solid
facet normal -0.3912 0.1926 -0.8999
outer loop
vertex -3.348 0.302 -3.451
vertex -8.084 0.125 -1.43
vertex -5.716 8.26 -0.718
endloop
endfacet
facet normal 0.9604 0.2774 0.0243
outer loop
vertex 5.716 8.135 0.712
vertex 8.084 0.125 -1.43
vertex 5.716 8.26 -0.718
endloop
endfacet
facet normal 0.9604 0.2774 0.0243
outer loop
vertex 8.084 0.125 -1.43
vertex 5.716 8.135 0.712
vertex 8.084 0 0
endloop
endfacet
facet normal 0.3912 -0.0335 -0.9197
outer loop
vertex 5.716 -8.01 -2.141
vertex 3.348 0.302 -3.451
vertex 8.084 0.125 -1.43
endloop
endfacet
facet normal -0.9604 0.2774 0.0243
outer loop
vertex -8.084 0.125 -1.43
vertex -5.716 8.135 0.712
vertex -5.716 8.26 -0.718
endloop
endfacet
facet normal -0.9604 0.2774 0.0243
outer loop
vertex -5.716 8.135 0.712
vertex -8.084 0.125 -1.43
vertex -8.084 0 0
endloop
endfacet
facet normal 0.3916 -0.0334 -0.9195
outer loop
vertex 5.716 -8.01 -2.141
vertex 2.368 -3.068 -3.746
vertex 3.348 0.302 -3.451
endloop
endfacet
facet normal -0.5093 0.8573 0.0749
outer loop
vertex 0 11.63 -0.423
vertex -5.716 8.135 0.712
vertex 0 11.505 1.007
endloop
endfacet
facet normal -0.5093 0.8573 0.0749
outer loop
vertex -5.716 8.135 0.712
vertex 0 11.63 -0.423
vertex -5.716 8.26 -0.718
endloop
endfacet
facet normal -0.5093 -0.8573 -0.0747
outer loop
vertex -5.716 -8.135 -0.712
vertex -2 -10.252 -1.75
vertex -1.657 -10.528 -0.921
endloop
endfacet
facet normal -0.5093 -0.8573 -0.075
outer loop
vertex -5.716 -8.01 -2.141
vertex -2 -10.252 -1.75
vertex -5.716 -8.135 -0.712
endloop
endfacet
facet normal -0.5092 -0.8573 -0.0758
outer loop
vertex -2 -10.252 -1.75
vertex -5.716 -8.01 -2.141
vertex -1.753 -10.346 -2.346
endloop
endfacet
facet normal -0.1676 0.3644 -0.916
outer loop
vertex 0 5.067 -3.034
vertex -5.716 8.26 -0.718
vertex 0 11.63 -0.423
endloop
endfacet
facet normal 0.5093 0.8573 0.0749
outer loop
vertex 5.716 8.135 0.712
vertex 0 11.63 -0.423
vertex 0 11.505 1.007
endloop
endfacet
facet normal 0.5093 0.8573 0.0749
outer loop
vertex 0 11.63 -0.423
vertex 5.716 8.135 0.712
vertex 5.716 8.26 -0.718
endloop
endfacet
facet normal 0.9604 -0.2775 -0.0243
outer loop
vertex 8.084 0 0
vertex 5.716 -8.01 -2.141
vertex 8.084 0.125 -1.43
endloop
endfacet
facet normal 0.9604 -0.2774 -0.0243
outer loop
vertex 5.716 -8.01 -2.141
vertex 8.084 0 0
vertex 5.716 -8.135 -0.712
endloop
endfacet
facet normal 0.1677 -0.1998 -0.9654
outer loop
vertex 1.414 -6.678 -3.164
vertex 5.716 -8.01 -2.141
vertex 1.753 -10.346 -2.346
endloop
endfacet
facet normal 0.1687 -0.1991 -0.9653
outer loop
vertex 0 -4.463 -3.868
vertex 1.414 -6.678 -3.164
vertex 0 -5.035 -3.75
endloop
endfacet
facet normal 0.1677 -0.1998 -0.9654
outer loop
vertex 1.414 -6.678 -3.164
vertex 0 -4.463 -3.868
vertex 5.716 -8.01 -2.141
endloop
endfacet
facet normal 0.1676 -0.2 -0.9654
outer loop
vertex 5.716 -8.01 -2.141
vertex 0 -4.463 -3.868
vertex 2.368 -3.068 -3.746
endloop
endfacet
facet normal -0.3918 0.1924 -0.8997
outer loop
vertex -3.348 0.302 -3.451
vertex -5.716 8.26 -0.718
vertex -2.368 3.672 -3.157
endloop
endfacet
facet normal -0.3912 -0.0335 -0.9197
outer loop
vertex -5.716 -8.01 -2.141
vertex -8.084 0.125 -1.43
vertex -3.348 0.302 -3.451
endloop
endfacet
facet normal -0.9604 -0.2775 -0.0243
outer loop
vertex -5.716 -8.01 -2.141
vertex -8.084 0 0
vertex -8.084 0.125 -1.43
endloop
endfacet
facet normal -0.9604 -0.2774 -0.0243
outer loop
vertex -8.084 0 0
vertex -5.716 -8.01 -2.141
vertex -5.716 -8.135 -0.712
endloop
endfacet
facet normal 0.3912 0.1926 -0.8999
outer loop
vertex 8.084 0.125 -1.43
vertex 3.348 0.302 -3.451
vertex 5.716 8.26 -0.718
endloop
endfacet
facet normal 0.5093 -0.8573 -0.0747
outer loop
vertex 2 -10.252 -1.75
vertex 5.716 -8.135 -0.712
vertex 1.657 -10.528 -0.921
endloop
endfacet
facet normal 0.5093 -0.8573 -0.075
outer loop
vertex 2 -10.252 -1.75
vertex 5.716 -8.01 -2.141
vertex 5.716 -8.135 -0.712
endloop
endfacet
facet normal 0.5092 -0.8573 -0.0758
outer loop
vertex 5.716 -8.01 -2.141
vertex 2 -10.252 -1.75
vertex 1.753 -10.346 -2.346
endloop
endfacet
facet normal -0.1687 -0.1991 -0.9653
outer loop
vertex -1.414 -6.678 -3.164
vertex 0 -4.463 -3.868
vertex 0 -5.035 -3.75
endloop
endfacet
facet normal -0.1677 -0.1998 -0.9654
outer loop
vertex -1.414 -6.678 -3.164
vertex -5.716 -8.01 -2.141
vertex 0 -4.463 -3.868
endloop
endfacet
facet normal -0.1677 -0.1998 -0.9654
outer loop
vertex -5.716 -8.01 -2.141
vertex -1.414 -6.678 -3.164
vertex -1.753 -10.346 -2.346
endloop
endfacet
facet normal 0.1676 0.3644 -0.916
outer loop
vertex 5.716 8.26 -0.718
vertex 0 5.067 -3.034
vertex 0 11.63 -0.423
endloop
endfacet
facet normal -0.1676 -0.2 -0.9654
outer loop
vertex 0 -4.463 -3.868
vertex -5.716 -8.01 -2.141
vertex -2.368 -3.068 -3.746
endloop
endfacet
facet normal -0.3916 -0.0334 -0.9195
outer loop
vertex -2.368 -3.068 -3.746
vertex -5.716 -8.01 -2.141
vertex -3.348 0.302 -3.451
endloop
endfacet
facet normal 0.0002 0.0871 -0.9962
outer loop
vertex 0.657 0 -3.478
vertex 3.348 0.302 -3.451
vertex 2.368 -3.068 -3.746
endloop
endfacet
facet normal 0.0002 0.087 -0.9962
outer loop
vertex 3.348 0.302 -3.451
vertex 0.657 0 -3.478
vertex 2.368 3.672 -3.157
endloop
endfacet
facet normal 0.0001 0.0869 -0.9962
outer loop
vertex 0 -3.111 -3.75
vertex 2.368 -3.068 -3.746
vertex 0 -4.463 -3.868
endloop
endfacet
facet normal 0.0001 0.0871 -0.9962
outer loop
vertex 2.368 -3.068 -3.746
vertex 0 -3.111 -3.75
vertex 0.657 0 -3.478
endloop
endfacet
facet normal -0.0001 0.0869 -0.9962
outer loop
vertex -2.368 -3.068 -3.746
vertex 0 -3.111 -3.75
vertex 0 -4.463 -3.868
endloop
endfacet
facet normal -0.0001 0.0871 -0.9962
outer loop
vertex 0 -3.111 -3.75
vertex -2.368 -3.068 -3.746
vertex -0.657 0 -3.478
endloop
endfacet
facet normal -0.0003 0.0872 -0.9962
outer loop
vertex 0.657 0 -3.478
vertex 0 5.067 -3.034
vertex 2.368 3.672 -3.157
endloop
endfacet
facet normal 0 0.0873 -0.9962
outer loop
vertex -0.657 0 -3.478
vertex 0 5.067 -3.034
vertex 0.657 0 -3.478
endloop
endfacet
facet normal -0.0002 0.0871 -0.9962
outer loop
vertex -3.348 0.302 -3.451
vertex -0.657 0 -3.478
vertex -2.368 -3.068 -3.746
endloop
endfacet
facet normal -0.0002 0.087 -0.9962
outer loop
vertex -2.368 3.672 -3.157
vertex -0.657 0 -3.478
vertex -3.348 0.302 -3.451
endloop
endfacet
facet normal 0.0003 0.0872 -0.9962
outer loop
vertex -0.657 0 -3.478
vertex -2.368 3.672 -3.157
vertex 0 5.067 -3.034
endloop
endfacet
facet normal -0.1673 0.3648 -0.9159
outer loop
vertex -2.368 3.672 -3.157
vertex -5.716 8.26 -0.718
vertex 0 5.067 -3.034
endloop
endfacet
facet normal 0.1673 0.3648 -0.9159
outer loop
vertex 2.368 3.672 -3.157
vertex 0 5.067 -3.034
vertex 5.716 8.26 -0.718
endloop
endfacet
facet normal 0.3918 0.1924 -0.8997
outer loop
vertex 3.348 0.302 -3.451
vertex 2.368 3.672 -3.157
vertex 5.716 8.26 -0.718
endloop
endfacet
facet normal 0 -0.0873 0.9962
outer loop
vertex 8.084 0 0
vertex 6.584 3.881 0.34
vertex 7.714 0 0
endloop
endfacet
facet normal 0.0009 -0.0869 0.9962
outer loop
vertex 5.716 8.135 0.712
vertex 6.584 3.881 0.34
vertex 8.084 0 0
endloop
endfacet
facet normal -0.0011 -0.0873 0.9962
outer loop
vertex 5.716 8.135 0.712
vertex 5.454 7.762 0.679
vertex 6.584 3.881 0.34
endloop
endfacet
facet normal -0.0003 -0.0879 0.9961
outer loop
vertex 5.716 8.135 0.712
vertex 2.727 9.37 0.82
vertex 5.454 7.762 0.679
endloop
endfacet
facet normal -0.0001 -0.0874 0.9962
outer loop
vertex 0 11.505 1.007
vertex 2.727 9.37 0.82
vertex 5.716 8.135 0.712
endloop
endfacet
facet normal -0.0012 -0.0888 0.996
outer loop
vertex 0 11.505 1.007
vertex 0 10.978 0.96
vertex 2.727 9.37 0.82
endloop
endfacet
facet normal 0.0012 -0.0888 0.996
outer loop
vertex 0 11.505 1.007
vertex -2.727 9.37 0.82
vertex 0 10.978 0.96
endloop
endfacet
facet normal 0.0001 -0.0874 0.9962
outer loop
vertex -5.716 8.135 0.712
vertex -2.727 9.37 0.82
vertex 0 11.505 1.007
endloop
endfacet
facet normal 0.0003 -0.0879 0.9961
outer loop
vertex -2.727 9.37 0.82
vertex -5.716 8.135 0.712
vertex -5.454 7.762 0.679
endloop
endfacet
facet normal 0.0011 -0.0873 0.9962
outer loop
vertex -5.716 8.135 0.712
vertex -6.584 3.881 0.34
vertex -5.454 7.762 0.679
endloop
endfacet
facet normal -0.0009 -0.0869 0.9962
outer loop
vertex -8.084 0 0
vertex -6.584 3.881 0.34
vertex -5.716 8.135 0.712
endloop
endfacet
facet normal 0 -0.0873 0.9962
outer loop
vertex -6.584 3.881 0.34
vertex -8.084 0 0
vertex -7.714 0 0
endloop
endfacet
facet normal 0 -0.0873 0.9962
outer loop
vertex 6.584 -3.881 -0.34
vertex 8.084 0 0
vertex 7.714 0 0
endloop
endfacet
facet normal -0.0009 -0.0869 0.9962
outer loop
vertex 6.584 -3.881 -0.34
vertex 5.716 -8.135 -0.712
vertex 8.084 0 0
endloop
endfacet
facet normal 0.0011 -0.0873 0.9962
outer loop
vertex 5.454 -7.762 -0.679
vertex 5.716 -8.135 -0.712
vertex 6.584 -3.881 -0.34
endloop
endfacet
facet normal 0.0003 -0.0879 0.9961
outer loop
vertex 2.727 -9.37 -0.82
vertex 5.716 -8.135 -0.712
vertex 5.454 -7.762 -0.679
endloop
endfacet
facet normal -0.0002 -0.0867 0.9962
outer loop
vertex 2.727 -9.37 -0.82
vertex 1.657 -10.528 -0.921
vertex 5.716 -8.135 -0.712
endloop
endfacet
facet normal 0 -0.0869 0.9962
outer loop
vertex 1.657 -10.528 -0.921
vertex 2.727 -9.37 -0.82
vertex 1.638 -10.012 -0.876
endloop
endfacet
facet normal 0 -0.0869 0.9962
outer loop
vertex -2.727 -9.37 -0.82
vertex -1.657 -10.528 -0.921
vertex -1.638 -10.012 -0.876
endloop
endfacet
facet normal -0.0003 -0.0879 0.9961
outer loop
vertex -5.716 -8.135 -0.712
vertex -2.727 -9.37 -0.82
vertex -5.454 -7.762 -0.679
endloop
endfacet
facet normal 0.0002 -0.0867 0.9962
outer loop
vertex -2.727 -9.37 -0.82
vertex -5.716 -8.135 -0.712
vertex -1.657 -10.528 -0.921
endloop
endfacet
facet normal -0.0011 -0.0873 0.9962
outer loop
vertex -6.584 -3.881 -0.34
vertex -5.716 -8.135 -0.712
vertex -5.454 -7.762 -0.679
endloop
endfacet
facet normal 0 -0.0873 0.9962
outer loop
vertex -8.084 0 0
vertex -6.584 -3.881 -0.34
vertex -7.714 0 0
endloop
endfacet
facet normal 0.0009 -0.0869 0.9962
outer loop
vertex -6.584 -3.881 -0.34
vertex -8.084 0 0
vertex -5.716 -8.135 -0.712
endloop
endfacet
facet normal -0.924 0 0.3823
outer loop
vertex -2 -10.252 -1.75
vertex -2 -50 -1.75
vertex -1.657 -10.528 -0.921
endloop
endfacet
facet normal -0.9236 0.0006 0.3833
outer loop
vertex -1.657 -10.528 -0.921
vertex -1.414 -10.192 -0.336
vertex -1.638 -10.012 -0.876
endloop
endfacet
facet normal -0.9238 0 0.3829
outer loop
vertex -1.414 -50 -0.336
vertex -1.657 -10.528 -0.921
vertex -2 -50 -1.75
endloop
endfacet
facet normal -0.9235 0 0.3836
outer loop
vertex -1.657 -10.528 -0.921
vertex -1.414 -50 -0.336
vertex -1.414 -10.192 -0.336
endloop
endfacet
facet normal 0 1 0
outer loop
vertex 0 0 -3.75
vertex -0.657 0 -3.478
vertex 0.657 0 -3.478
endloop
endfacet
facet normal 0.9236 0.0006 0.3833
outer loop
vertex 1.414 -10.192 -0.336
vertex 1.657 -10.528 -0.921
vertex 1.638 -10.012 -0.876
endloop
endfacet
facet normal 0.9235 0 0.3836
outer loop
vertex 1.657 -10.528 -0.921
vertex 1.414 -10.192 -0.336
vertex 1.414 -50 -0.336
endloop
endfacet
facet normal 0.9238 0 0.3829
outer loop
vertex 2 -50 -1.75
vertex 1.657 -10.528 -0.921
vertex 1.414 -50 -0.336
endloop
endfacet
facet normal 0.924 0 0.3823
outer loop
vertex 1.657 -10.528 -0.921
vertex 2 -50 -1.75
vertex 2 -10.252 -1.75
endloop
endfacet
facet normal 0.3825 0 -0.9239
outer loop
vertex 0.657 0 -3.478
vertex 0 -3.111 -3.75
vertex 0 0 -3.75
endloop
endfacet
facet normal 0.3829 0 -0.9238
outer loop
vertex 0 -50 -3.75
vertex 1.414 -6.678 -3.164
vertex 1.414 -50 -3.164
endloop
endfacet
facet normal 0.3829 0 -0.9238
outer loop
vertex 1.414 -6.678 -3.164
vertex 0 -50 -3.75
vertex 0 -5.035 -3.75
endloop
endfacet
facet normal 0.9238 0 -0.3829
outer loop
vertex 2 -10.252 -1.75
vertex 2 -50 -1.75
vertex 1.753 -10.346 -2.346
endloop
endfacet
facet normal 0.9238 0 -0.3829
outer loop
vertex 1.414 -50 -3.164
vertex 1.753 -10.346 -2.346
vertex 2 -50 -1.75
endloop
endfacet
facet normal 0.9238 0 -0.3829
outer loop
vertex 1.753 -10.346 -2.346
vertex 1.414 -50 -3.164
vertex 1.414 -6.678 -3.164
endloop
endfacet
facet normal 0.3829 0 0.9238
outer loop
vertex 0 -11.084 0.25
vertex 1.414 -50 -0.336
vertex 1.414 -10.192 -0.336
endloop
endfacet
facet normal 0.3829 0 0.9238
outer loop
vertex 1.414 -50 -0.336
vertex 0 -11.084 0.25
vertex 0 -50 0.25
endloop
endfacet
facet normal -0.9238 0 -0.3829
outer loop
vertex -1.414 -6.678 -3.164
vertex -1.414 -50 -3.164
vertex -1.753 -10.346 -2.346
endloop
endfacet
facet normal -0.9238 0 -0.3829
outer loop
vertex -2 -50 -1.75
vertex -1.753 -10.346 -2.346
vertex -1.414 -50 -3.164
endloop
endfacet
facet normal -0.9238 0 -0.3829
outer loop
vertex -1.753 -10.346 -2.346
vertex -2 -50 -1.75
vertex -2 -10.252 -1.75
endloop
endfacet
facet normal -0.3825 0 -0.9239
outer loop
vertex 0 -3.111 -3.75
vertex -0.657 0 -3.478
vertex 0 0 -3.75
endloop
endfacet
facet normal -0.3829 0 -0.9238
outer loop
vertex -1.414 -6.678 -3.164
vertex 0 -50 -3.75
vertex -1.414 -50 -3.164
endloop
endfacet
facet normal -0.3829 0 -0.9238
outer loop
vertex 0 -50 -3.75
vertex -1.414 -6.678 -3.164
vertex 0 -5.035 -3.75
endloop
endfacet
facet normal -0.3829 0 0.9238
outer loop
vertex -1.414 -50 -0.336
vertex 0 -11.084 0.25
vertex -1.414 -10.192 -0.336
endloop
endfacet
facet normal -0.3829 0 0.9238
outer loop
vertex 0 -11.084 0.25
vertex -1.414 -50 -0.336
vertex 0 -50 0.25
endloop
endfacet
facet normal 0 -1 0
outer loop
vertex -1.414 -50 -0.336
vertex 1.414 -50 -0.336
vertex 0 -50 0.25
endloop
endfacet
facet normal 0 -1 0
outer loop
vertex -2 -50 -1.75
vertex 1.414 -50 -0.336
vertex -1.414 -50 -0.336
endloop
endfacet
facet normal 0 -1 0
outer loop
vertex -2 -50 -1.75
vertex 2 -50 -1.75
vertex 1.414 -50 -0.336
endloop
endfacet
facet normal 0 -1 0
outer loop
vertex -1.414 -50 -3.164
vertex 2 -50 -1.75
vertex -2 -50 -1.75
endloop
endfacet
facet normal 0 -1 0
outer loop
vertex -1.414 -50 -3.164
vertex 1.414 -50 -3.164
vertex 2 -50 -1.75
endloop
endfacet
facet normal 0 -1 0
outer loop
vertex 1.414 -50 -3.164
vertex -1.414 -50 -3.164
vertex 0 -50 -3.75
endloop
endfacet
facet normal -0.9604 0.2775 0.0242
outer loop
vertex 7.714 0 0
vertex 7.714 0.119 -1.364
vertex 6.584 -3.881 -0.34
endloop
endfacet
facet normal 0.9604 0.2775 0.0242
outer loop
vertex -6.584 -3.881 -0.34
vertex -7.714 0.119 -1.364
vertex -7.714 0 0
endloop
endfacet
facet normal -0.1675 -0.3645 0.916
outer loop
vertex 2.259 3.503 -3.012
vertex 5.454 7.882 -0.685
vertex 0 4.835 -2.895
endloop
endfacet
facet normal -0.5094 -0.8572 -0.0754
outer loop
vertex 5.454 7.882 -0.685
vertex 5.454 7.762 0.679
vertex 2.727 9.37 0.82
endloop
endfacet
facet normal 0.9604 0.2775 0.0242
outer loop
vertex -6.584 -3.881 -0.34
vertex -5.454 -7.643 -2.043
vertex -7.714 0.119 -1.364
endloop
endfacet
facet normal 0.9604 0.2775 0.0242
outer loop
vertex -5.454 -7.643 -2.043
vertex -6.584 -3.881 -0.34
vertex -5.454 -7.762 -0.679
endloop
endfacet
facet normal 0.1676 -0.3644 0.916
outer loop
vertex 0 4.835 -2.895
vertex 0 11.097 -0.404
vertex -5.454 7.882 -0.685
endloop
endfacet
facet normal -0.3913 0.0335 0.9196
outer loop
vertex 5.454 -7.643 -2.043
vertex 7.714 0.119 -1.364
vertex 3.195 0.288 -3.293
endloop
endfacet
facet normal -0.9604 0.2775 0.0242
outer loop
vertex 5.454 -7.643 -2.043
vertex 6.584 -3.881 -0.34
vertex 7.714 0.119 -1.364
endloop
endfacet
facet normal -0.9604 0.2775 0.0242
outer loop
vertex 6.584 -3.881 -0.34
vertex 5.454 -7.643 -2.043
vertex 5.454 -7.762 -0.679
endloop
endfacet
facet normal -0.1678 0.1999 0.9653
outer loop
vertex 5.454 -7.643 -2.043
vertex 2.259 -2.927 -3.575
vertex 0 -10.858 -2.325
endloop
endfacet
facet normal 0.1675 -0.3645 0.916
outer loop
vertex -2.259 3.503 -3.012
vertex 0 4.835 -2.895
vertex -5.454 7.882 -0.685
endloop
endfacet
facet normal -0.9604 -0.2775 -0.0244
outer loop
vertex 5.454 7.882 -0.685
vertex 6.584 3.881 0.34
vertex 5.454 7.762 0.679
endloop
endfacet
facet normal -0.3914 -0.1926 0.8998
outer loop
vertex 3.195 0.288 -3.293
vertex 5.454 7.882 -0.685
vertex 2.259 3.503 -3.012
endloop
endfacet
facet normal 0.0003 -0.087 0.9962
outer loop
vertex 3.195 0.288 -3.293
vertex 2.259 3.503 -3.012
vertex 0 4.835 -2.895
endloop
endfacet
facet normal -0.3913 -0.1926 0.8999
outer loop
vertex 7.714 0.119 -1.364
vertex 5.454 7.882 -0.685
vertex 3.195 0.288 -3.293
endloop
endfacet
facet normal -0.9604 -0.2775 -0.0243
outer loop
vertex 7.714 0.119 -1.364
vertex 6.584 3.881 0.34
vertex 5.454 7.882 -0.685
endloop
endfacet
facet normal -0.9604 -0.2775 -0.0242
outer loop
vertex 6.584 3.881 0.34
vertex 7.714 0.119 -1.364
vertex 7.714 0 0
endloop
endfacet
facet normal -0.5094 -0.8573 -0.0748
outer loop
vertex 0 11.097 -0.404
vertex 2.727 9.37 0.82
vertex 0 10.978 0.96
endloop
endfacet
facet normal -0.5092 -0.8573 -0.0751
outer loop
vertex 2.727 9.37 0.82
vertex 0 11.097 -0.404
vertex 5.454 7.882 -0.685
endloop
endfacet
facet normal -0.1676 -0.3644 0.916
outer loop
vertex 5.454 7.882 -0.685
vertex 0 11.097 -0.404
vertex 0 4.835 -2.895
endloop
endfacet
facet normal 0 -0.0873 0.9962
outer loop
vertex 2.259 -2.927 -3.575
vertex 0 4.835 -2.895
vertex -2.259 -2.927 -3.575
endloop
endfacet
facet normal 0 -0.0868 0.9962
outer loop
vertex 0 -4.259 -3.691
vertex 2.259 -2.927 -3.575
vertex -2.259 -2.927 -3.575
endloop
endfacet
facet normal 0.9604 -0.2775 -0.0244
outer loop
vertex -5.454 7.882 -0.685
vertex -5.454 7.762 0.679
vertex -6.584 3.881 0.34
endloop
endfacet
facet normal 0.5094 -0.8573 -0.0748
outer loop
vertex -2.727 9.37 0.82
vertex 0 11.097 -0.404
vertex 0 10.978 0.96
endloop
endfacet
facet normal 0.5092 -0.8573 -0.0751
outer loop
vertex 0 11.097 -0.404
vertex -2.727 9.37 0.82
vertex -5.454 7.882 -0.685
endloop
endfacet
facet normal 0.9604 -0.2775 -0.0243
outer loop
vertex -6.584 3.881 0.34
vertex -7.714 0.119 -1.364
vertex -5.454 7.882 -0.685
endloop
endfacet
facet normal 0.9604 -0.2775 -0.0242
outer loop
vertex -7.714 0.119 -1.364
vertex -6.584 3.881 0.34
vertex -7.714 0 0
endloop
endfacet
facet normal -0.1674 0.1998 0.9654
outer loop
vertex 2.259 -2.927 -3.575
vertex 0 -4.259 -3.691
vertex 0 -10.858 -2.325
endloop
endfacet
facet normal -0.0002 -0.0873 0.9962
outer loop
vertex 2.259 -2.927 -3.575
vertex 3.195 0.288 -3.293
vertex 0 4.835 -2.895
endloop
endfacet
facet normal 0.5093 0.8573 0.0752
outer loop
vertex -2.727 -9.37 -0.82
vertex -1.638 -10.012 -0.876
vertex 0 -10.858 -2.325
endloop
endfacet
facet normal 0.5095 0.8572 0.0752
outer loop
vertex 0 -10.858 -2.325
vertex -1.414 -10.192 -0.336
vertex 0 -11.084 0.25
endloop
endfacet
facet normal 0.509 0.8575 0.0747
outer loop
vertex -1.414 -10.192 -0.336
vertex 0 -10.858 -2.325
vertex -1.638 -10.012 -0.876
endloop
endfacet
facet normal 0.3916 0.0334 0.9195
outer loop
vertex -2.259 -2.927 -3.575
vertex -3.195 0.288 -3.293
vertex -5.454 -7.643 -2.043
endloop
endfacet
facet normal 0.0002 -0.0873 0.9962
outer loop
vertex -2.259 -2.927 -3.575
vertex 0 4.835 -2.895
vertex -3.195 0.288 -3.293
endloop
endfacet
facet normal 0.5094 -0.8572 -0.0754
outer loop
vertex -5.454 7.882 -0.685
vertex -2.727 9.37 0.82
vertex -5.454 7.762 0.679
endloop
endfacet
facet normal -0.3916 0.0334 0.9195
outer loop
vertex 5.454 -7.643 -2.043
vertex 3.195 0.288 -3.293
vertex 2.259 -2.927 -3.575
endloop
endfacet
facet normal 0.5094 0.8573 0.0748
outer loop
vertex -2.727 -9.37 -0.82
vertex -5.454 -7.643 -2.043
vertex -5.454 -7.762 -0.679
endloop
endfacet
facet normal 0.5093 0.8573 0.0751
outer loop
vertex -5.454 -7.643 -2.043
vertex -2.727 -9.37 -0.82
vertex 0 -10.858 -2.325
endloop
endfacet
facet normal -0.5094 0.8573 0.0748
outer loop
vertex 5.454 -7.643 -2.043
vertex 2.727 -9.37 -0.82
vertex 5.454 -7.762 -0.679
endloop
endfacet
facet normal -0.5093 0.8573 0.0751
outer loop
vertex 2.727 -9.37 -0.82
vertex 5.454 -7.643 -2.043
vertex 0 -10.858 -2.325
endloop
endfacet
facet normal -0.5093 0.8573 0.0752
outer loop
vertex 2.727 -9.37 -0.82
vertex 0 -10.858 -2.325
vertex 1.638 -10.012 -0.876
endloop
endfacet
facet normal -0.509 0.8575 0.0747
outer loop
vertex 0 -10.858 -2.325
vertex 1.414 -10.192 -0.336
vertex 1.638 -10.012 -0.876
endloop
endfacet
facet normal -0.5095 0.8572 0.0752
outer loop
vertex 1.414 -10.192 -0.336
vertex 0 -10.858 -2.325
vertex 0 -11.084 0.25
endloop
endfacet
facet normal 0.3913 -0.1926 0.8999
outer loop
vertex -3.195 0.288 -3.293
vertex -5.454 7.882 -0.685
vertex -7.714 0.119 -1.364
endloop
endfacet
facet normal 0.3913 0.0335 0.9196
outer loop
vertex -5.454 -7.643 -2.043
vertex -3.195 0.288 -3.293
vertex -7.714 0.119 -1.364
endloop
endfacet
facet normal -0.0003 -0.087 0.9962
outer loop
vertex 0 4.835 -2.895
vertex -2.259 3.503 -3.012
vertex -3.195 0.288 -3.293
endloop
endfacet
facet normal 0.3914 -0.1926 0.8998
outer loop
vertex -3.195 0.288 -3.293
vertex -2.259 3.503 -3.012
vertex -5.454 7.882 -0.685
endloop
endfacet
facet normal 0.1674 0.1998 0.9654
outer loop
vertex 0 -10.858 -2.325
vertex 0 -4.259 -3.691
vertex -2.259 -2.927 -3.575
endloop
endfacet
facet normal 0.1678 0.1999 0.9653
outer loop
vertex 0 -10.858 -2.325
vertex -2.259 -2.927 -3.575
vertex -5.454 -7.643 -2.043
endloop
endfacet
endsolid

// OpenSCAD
// vim:ts=4:sw=4:sts=4:et:ai
wall_width      = .6;
diamiter        = 25;
handle_diamiter = 4;
handle_sides    = 8;
resolution      = 8;

$fn=resolution;

module spool_bowl(){
    rotate([5,0,0]) scale([.7,1,.3]) difference() {
        sphere(d=diamiter);
        translate([-50,-50,0]) cube([100,100,100]);
    }
}

module spool_bowl_taken(){
    rotate([5,0,0]) scale([.7,1,.3]) difference() {
        sphere(d=diamiter);
    }
}

module handle(){
    diamiter = diamiter*.3;
    translate([0,0,(-diamiter/2)+handle_diamiter/2]) rotate([90,45,0]){
        cylinder(d=handle_diamiter, h=50, $fn=handle_sides);
    }
}

difference(){
    union(){
        spool_bowl();
        handle();
    }
    scale([diamiter/(diamiter+(wall_width*2)),diamiter/(diamiter+(wall_width*2)),diamiter/(diamiter+(wall_width*2))]) spool_bowl_taken();
}
